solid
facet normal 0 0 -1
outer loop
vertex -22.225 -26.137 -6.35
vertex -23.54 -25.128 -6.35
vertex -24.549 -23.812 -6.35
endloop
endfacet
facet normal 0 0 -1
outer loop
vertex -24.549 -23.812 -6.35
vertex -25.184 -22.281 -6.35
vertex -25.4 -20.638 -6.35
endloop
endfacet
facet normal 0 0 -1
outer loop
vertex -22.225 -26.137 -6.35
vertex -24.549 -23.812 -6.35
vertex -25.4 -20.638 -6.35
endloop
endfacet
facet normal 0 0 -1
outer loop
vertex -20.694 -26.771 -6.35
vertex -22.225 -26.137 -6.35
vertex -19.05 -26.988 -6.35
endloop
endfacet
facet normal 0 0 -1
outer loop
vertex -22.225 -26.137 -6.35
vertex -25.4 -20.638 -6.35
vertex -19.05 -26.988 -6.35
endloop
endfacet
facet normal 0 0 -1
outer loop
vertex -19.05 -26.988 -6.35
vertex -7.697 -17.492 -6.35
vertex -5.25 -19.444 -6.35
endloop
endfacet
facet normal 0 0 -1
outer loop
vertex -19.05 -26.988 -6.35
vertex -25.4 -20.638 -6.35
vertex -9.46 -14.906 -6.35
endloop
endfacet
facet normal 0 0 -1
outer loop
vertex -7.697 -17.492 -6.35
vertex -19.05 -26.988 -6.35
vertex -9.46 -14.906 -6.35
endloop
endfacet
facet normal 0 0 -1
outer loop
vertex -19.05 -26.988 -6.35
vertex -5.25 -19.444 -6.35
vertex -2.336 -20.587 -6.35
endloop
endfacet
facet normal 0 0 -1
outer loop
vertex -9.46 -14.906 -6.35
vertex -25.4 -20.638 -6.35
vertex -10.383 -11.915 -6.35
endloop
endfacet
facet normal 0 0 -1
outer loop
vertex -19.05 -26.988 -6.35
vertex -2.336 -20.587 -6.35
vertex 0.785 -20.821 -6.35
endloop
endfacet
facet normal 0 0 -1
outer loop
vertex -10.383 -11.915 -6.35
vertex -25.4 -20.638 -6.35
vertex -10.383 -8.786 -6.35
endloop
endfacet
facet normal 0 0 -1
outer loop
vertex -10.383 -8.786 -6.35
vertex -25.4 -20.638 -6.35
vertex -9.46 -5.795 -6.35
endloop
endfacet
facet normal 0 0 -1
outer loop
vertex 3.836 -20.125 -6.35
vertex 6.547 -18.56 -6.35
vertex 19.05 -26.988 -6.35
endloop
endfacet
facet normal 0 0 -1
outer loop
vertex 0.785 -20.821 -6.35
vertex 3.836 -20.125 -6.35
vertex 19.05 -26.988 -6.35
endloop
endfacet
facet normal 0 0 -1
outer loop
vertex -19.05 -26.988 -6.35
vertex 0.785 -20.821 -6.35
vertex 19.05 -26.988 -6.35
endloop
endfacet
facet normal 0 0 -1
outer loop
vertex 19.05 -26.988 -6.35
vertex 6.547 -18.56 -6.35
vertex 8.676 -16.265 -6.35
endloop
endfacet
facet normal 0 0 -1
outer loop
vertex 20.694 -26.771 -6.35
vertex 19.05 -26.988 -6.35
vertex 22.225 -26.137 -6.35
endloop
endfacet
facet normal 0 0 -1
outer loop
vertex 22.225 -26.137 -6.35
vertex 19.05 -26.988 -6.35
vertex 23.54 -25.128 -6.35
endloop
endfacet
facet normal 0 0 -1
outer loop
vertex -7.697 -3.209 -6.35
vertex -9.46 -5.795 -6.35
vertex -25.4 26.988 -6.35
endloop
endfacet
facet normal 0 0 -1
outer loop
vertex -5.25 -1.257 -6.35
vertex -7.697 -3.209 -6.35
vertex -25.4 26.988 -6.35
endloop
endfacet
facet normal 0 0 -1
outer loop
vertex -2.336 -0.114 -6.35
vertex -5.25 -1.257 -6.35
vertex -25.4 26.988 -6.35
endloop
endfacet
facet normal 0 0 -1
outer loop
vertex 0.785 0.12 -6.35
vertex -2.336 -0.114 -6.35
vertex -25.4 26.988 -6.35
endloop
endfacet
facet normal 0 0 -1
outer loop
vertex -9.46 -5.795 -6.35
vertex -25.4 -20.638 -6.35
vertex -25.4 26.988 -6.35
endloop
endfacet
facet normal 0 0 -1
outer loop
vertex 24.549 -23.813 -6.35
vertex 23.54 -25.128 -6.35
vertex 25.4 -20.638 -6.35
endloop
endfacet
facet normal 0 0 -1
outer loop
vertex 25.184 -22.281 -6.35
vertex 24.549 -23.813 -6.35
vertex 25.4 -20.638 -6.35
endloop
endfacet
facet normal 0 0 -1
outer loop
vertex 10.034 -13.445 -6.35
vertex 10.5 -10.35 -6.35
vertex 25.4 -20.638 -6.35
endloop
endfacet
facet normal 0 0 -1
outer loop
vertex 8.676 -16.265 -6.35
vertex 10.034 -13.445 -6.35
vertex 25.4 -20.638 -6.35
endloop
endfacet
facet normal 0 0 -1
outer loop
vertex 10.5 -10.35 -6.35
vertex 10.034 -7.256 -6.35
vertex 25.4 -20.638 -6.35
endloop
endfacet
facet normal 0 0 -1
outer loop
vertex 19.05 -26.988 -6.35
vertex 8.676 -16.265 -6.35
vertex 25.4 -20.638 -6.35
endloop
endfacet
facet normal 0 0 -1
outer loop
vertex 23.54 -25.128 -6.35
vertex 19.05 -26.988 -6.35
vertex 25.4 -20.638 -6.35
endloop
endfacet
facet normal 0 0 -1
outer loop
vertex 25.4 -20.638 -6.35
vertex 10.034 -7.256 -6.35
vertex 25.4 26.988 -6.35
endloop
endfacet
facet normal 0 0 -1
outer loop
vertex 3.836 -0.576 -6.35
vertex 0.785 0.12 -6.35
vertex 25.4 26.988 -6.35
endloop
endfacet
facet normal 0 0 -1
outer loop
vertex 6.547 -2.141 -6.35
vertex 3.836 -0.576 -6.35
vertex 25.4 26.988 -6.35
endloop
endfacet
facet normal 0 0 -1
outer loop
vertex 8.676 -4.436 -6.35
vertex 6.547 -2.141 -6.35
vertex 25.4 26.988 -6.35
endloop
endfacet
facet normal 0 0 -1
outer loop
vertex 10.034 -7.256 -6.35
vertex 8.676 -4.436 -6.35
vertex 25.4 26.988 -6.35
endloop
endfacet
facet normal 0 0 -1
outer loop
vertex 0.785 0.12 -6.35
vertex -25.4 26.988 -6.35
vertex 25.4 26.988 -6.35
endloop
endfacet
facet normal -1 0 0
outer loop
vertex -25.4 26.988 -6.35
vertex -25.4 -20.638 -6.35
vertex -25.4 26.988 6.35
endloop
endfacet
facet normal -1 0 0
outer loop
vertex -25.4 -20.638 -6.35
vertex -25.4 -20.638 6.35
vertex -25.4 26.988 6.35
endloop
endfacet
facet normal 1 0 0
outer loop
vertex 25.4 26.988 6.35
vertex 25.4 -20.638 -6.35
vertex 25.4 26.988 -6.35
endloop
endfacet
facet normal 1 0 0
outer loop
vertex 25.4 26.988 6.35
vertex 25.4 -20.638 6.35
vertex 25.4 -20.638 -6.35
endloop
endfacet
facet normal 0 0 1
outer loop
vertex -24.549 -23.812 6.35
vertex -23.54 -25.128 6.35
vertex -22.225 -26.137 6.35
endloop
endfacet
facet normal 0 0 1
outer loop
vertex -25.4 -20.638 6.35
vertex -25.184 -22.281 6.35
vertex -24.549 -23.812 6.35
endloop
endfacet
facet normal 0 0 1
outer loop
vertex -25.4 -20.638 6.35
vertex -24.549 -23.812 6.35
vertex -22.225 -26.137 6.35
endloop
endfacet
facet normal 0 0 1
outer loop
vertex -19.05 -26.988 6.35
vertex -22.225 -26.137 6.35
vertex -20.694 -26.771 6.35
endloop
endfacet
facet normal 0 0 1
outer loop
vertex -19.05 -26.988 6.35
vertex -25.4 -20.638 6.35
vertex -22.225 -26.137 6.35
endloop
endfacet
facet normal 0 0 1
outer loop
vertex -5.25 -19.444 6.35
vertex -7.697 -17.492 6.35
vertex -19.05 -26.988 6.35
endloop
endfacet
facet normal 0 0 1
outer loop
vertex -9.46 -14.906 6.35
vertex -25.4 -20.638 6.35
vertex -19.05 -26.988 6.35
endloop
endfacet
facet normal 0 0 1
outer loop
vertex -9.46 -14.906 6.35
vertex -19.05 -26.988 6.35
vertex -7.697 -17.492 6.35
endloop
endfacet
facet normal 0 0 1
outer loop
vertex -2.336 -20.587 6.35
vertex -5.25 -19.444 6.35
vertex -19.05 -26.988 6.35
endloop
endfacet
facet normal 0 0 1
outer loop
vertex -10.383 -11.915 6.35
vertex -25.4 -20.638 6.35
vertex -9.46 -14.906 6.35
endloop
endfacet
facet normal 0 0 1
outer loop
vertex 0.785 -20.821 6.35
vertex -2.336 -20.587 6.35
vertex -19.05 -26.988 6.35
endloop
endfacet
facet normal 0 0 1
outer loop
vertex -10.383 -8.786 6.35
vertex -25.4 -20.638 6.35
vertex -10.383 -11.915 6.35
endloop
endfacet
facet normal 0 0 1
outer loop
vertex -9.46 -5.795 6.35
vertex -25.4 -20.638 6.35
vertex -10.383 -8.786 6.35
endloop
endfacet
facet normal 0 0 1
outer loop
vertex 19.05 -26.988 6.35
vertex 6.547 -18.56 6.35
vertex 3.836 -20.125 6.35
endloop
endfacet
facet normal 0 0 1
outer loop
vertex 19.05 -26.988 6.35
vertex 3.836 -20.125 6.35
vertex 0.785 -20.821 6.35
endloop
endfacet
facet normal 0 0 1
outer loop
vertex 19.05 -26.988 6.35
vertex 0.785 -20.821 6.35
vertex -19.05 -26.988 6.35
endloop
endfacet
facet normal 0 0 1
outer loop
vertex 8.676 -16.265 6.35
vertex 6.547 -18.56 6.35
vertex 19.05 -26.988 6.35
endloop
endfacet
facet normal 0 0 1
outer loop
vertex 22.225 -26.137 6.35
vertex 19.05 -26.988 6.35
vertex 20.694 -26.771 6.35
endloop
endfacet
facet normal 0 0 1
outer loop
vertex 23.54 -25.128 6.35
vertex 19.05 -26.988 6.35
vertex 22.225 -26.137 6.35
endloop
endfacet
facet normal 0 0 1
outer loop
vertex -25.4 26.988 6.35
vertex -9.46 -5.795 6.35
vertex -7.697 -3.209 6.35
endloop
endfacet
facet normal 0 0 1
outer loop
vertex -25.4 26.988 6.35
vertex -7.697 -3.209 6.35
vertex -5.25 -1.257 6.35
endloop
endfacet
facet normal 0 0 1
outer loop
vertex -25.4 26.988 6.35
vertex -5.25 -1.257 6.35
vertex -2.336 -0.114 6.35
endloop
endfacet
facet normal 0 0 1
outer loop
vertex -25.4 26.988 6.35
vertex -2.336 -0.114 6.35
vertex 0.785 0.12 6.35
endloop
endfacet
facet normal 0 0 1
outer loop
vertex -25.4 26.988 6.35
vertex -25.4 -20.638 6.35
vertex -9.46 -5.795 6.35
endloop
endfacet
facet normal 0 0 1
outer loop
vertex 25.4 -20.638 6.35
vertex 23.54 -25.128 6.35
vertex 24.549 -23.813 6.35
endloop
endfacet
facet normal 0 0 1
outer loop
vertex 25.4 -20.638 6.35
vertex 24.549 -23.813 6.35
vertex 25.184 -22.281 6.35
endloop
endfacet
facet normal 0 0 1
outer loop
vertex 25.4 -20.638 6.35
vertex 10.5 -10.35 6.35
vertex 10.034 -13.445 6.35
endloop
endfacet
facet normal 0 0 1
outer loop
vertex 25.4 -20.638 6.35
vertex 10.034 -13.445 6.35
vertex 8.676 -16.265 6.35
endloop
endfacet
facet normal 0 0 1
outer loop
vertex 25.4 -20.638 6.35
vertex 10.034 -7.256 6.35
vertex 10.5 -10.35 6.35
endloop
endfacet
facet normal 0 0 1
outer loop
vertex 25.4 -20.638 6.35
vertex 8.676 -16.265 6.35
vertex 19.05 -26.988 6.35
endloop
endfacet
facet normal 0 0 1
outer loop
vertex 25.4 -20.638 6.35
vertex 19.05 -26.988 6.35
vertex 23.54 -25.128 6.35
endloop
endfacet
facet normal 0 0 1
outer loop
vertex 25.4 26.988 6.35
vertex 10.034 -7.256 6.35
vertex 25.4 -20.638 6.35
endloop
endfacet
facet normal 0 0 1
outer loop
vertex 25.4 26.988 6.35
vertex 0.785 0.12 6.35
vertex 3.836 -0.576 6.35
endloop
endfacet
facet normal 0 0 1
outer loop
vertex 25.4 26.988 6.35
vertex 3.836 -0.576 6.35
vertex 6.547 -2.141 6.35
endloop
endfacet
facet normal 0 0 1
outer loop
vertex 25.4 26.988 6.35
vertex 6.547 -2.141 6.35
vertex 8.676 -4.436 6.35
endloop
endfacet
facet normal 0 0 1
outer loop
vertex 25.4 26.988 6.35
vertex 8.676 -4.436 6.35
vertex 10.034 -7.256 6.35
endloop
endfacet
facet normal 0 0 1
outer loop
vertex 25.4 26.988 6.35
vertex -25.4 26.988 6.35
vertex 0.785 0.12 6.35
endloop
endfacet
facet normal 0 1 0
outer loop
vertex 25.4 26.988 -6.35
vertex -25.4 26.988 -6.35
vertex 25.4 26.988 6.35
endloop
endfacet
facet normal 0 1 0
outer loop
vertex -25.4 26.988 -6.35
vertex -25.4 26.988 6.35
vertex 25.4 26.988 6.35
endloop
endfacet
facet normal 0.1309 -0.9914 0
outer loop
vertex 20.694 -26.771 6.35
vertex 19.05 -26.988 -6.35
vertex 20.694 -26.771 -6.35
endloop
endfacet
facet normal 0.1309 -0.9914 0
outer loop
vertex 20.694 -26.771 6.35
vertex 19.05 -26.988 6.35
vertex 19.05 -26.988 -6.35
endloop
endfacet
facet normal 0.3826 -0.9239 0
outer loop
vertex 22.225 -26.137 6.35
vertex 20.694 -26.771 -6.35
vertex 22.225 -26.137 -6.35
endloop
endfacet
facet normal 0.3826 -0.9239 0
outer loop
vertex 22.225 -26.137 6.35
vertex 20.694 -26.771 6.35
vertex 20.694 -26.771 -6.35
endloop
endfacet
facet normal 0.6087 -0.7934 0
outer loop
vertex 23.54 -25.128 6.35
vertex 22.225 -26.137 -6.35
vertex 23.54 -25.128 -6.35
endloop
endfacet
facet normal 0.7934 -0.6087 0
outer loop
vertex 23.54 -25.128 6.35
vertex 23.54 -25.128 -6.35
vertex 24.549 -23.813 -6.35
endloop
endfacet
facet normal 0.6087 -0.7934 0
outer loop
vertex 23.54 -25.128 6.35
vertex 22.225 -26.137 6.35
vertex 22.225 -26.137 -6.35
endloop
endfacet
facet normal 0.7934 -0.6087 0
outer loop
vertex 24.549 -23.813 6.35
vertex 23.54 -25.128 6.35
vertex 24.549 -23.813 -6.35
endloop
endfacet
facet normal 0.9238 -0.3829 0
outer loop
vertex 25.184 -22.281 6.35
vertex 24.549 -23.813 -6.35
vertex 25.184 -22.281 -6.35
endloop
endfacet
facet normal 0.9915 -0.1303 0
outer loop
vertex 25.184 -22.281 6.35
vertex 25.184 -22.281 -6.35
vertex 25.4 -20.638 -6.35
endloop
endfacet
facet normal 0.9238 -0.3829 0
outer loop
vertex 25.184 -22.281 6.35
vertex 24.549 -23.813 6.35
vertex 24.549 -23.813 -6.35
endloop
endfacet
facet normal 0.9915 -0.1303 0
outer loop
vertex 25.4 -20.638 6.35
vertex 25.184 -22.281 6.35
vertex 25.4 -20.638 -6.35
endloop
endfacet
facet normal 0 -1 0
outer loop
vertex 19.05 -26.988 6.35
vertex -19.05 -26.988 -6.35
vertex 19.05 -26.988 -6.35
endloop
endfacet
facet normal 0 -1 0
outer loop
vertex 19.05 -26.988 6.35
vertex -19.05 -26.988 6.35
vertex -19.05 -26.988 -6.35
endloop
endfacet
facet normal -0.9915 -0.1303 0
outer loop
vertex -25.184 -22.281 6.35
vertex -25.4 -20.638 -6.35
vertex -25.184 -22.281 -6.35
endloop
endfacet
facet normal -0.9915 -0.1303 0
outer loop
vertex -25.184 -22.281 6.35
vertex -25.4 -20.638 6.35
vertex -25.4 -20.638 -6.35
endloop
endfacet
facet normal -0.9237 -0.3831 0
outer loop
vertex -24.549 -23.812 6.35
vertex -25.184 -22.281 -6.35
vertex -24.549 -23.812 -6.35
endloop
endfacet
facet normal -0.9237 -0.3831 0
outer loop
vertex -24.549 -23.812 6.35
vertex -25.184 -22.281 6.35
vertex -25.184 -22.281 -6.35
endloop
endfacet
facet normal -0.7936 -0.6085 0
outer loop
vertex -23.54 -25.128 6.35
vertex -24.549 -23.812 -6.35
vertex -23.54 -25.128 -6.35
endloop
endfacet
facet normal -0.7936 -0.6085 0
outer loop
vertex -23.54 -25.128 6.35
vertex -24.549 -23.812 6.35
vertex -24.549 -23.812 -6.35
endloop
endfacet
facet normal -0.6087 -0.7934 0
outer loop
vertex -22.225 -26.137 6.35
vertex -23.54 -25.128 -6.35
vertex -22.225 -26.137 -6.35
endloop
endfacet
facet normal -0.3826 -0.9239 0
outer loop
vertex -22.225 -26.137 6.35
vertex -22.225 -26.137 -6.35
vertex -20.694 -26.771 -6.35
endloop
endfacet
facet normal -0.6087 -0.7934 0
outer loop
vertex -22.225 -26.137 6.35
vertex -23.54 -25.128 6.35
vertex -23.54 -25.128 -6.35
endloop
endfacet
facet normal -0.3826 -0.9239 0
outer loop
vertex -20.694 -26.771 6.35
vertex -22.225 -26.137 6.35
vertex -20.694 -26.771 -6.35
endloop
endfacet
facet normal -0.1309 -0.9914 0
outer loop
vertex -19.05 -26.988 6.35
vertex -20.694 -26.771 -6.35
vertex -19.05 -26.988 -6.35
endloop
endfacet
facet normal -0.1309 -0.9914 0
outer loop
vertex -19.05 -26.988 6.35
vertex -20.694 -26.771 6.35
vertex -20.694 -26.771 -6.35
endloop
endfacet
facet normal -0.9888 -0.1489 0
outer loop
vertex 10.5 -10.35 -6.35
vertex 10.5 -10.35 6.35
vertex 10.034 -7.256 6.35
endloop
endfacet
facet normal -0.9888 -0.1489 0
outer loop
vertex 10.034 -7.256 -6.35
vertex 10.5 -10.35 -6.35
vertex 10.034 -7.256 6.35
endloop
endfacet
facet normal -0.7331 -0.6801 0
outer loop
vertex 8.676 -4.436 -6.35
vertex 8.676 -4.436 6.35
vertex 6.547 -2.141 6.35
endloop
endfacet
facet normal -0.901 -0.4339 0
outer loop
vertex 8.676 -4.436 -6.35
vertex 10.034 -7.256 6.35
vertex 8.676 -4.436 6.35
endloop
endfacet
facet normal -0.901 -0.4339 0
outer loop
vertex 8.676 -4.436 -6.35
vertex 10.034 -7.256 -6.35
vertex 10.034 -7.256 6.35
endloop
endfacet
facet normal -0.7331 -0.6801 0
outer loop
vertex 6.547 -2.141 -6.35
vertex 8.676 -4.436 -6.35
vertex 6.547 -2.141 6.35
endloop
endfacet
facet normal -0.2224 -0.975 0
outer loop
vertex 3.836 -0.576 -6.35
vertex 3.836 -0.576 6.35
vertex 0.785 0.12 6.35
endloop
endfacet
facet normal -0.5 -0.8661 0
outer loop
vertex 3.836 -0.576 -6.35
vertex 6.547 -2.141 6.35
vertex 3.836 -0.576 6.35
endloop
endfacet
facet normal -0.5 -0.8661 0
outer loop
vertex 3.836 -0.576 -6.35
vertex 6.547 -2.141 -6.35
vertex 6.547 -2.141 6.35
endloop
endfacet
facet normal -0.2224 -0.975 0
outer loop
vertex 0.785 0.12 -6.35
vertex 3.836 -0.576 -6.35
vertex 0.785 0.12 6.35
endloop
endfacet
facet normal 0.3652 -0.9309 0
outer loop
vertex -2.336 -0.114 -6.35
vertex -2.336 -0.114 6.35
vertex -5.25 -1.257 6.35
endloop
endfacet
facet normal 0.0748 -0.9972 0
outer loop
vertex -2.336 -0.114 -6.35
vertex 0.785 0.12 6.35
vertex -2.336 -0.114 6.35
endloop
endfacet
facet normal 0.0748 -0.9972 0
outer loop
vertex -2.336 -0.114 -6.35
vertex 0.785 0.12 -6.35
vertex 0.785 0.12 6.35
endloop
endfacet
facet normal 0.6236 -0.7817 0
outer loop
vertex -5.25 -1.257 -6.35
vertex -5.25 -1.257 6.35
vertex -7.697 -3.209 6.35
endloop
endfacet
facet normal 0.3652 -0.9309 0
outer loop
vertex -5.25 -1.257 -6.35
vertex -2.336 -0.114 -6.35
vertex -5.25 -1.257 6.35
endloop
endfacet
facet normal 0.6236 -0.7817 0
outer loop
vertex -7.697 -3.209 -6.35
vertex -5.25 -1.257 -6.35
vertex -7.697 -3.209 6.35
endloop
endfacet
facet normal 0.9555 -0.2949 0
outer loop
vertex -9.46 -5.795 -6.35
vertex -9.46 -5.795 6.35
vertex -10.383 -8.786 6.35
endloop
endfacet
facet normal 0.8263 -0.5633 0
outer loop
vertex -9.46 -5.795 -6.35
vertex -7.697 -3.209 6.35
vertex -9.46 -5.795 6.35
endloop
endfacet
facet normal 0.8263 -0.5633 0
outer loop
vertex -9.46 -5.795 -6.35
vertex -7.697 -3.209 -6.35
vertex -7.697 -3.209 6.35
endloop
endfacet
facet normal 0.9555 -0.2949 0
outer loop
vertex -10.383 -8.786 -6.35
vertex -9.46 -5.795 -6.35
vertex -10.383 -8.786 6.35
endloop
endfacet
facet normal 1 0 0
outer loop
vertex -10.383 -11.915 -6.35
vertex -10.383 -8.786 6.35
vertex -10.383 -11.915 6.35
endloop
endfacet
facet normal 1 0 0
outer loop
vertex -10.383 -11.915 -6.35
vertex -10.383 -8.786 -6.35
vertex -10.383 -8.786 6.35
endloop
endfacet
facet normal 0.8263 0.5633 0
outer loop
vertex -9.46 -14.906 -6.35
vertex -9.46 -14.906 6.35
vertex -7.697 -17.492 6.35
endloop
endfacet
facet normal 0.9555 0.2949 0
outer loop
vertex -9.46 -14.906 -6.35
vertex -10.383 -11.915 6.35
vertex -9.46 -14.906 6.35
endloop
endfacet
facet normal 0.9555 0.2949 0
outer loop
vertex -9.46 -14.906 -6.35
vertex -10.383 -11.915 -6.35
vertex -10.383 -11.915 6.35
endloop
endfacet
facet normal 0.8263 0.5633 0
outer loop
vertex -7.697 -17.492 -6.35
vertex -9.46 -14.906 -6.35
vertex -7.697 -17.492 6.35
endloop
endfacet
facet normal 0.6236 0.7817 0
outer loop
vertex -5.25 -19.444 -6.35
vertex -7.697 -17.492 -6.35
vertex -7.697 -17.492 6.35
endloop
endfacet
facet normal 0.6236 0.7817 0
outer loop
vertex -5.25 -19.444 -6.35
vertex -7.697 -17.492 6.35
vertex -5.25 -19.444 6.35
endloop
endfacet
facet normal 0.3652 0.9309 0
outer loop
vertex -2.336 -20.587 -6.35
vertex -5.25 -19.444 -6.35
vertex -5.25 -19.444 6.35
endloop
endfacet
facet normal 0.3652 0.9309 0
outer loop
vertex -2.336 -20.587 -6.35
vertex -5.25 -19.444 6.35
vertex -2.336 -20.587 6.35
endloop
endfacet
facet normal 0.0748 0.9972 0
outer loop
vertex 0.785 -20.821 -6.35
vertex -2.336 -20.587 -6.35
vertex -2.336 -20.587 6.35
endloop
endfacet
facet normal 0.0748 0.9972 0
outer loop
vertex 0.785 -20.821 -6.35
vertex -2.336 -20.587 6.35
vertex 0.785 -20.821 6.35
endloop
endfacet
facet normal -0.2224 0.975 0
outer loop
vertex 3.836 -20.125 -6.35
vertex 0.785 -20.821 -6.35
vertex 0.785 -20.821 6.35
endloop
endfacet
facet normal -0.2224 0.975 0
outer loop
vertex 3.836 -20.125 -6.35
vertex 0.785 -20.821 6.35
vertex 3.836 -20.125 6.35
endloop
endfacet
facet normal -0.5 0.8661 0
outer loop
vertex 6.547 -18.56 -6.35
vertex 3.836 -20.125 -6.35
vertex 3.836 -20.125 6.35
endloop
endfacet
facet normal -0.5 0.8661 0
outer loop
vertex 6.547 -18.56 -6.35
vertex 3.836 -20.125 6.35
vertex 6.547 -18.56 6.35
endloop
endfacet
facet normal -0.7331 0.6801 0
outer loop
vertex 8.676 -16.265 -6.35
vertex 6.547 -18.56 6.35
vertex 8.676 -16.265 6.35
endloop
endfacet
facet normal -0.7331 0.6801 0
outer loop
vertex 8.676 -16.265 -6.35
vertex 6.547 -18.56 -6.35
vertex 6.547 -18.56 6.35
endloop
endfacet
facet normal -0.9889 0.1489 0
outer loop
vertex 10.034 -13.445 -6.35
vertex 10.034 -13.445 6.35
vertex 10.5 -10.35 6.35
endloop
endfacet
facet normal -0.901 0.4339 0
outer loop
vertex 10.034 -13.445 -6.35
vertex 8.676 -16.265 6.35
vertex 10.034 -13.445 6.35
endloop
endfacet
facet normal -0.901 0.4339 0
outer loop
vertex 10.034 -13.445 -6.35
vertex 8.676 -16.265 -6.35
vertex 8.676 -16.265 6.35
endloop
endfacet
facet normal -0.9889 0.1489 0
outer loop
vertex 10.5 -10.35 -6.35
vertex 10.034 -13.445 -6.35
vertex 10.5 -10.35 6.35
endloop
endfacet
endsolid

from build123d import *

# Parameters (mm, degrees)
SKETCH1_W               = 50.8
SKETCH1_H               = 53.975
BOSS_EXTRUDE1_DEPTH     = 6.35
CUT_EXTRUDE1_DEPTH      = 40.176206507
CUT_EXTRUDE1_DEPTH_BACK = 40.176206507
SKETCH2_R               = 10.499999971
FILLET1_R               = 6.35


with BuildPart() as part:
    # Sketch1 → Boss-Extrude1 (new, symmetric)
    with BuildSketch(Plane.XY):
        Rectangle(SKETCH1_W, SKETCH1_H)
    extrude(amount=BOSS_EXTRUDE1_DEPTH, both=True)

    # Sketch2 → Cut-Extrude1 (cut, two sides: drawn at the far end of the back side and taken through both)
    with BuildSketch(Plane.XY.offset(6.35).offset(-CUT_EXTRUDE1_DEPTH_BACK)):
        with Locations((0, -10.3505)):
            Circle(SKETCH2_R)
    extrude(amount=CUT_EXTRUDE1_DEPTH + CUT_EXTRUDE1_DEPTH_BACK, mode=Mode.SUBTRACT)

    # Fillet1
    fillet1_edges = [part.edges().sort_by_distance(p)[0] for p in [
        (25.4, -26.9875, 0),
        (-25.4, -26.9875, 0),
    ]]
    fillet(fillet1_edges, radius=FILLET1_R)


solid = part.part
